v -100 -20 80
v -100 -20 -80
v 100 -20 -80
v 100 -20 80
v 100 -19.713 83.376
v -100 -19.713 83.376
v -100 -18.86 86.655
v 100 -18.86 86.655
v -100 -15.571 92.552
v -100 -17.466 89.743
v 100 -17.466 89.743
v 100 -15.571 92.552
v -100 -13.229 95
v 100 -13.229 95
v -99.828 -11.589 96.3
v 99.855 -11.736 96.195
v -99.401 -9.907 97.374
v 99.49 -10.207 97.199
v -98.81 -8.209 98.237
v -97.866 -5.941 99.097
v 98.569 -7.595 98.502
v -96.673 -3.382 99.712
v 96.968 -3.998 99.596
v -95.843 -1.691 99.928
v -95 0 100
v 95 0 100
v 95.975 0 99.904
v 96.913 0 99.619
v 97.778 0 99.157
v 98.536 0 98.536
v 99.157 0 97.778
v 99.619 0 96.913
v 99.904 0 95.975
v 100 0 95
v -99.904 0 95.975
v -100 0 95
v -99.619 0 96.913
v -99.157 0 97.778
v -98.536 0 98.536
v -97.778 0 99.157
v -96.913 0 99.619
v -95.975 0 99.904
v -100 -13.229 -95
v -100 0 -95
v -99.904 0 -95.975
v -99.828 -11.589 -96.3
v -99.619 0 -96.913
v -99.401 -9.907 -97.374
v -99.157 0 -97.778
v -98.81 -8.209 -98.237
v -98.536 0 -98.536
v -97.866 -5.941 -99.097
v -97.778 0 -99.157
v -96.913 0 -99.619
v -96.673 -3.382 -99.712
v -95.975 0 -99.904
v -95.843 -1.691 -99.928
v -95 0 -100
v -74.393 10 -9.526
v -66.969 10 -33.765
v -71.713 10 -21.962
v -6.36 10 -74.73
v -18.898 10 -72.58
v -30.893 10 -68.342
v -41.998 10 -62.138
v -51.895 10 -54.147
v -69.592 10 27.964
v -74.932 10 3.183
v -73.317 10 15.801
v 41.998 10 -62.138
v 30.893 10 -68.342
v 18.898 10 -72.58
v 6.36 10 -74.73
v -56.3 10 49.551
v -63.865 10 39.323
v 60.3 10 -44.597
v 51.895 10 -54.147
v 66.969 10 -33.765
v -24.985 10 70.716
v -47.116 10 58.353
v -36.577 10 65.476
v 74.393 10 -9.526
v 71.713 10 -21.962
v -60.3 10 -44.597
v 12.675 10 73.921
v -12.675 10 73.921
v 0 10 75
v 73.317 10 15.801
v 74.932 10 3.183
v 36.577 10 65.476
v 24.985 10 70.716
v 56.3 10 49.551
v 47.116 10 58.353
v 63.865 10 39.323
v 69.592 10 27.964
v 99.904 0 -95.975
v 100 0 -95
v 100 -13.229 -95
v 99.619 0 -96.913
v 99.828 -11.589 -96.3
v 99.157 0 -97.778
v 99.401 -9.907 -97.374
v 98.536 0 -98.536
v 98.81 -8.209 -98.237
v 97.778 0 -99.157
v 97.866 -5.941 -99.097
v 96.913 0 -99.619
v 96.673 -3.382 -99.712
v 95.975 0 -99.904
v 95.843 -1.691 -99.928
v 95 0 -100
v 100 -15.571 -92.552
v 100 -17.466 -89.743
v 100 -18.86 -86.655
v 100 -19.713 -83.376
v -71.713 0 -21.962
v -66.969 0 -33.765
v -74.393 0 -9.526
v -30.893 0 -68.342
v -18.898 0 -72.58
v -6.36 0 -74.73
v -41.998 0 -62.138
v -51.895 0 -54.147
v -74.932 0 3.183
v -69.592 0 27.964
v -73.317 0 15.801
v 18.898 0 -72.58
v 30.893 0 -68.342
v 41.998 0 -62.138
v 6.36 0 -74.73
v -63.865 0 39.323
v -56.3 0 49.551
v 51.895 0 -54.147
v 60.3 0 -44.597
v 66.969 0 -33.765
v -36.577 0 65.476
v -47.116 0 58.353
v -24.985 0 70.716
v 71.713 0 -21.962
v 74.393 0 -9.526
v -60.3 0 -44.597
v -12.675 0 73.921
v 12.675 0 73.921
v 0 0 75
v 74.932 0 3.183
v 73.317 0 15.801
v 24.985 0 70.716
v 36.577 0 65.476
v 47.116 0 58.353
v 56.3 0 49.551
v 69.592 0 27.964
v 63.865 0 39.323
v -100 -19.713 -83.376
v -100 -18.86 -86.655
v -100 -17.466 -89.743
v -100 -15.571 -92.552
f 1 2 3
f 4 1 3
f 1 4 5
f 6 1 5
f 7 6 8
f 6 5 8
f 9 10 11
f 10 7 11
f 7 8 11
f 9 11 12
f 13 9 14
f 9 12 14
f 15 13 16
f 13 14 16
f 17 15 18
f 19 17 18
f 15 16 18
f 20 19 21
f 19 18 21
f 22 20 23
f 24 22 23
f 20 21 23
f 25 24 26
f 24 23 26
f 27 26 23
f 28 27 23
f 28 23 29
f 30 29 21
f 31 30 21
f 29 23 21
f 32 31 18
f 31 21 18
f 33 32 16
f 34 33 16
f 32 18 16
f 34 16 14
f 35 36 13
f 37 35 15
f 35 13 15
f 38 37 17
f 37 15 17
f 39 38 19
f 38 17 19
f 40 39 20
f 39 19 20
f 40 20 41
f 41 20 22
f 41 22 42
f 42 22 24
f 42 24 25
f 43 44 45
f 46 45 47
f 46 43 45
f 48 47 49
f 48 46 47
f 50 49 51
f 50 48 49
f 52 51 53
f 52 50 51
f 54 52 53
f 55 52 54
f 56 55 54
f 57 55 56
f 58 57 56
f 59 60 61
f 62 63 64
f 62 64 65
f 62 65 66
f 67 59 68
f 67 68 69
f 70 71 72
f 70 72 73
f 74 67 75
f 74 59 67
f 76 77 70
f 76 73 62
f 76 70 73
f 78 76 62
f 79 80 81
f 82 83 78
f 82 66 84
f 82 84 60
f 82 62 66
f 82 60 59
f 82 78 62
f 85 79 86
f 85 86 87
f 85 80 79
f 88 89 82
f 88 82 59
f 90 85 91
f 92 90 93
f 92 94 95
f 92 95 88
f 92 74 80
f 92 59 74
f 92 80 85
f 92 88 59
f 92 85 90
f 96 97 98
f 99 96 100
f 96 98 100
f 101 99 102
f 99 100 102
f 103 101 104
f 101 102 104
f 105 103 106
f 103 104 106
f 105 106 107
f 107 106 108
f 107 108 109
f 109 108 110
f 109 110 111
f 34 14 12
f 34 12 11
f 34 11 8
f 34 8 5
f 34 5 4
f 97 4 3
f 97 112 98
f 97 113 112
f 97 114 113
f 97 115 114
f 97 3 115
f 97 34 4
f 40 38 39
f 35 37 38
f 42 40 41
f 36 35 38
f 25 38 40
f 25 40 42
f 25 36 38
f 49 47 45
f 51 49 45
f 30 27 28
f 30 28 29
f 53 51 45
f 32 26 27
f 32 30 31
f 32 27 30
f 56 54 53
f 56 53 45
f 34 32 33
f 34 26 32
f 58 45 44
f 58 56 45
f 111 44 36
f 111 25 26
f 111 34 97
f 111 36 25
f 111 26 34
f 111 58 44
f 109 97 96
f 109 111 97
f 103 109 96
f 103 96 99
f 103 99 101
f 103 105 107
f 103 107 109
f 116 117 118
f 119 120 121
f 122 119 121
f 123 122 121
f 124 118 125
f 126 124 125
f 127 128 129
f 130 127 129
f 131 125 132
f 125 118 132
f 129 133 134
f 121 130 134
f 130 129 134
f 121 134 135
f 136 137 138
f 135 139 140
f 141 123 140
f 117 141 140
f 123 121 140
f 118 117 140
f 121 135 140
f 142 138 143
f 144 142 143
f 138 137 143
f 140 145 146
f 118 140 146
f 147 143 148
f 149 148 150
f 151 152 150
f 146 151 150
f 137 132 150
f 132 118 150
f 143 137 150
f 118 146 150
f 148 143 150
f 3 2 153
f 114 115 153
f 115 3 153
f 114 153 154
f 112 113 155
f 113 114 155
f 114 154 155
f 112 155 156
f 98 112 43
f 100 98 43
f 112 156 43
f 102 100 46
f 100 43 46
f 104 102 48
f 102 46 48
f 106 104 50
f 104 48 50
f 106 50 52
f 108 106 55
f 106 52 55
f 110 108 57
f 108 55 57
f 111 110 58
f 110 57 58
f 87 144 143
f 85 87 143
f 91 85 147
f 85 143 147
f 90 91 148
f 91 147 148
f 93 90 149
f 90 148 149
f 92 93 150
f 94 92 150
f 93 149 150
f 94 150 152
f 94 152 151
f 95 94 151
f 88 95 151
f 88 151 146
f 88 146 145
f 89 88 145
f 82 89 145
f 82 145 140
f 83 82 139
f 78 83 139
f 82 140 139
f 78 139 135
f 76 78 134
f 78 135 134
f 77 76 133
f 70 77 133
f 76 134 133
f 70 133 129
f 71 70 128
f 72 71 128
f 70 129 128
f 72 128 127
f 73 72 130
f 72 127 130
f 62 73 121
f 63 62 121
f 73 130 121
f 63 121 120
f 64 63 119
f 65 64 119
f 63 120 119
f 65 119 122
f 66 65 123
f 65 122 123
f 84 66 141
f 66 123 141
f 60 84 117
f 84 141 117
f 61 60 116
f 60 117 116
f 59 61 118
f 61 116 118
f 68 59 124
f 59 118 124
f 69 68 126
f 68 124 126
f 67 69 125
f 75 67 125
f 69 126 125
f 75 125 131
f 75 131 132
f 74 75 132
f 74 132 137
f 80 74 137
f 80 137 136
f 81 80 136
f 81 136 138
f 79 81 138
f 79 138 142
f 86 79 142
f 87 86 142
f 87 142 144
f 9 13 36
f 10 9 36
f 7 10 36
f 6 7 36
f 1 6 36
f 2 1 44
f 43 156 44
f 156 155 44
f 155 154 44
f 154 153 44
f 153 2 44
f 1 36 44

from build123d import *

# Parameters (mm, degrees)
TURNTABLE_SKETCH_R          = 75
TURNTABLE_EXTRUDE_DEPTH     = 10
SUPPORT_PLATE_SKETCH_W      = 200
SUPPORT_PLATE_SKETCH_H      = 200
SUPPORT_PLATE_EXTRUDE_DEPTH = 20
SUPPORT_PLATE_FILLET_R      = 5
BOTTOM_FILLET_R             = 20


with BuildPart() as part:
    # Turntable Sketch → Turntable Extrude (new body)
    with BuildSketch(Plane(origin=(0, 0, 0), x_dir=(1, 0, 0), z_dir=(0, 1, 0))):
        with Locations(Location((0, 0, 0), (0, 0, 270))):
            Circle(TURNTABLE_SKETCH_R)
    extrude(amount=TURNTABLE_EXTRUDE_DEPTH)


with BuildPart() as body_2:
    # Support Plate Sketch → Support Plate Extrude (new body)
    with BuildSketch(Plane(origin=(0, 0, 0), x_dir=(1, 0, 0), z_dir=(0, 1, 0))):
        Rectangle(SUPPORT_PLATE_SKETCH_W, SUPPORT_PLATE_SKETCH_H)
    extrude(amount=-SUPPORT_PLATE_EXTRUDE_DEPTH)

    # Support Plate Fillet
    support_plate_fillet_edges = [body_2.edges().sort_by_distance(p)[0] for p in [
        (100, -10, 100),
        (-100, -10, 100),
        (-100, -10, -100),
        (100, -10, -100),
    ]]
    fillet(support_plate_fillet_edges, radius=SUPPORT_PLATE_FILLET_R)

    # Bottom Fillet
    # the kernel refuses this fillet: 20 mm, written as the material it takes off along each edge
    with BuildSketch(Plane(origin=(-145, -20, -100), x_dir=(0, 1, 0), z_dir=(1, 0, 0))) as bottom_fillet_piece_1:
        with BuildLine():
            CenterArc((BOTTOM_FILLET_R, BOTTOM_FILLET_R), BOTTOM_FILLET_R, 180, 90)
            Line((0, BOTTOM_FILLET_R), (0, 0))
            Line((0, 0), (BOTTOM_FILLET_R, 0))
        make_face()
    extrude(amount=290, mode=Mode.SUBTRACT)
    with BuildSketch(Plane(origin=(145, -20, 100), x_dir=(0, 0, -1), z_dir=(-1, 0, 0))) as bottom_fillet_piece_2:
        with BuildLine():
            CenterArc((BOTTOM_FILLET_R, -BOTTOM_FILLET_R), BOTTOM_FILLET_R, 90, 90)
            Line((0, -BOTTOM_FILLET_R), (0, 0))
            Line((0, 0), (BOTTOM_FILLET_R, 0))
        make_face()
    extrude(amount=290, mode=Mode.SUBTRACT)


solid = Compound([part.part, body_2.part])
